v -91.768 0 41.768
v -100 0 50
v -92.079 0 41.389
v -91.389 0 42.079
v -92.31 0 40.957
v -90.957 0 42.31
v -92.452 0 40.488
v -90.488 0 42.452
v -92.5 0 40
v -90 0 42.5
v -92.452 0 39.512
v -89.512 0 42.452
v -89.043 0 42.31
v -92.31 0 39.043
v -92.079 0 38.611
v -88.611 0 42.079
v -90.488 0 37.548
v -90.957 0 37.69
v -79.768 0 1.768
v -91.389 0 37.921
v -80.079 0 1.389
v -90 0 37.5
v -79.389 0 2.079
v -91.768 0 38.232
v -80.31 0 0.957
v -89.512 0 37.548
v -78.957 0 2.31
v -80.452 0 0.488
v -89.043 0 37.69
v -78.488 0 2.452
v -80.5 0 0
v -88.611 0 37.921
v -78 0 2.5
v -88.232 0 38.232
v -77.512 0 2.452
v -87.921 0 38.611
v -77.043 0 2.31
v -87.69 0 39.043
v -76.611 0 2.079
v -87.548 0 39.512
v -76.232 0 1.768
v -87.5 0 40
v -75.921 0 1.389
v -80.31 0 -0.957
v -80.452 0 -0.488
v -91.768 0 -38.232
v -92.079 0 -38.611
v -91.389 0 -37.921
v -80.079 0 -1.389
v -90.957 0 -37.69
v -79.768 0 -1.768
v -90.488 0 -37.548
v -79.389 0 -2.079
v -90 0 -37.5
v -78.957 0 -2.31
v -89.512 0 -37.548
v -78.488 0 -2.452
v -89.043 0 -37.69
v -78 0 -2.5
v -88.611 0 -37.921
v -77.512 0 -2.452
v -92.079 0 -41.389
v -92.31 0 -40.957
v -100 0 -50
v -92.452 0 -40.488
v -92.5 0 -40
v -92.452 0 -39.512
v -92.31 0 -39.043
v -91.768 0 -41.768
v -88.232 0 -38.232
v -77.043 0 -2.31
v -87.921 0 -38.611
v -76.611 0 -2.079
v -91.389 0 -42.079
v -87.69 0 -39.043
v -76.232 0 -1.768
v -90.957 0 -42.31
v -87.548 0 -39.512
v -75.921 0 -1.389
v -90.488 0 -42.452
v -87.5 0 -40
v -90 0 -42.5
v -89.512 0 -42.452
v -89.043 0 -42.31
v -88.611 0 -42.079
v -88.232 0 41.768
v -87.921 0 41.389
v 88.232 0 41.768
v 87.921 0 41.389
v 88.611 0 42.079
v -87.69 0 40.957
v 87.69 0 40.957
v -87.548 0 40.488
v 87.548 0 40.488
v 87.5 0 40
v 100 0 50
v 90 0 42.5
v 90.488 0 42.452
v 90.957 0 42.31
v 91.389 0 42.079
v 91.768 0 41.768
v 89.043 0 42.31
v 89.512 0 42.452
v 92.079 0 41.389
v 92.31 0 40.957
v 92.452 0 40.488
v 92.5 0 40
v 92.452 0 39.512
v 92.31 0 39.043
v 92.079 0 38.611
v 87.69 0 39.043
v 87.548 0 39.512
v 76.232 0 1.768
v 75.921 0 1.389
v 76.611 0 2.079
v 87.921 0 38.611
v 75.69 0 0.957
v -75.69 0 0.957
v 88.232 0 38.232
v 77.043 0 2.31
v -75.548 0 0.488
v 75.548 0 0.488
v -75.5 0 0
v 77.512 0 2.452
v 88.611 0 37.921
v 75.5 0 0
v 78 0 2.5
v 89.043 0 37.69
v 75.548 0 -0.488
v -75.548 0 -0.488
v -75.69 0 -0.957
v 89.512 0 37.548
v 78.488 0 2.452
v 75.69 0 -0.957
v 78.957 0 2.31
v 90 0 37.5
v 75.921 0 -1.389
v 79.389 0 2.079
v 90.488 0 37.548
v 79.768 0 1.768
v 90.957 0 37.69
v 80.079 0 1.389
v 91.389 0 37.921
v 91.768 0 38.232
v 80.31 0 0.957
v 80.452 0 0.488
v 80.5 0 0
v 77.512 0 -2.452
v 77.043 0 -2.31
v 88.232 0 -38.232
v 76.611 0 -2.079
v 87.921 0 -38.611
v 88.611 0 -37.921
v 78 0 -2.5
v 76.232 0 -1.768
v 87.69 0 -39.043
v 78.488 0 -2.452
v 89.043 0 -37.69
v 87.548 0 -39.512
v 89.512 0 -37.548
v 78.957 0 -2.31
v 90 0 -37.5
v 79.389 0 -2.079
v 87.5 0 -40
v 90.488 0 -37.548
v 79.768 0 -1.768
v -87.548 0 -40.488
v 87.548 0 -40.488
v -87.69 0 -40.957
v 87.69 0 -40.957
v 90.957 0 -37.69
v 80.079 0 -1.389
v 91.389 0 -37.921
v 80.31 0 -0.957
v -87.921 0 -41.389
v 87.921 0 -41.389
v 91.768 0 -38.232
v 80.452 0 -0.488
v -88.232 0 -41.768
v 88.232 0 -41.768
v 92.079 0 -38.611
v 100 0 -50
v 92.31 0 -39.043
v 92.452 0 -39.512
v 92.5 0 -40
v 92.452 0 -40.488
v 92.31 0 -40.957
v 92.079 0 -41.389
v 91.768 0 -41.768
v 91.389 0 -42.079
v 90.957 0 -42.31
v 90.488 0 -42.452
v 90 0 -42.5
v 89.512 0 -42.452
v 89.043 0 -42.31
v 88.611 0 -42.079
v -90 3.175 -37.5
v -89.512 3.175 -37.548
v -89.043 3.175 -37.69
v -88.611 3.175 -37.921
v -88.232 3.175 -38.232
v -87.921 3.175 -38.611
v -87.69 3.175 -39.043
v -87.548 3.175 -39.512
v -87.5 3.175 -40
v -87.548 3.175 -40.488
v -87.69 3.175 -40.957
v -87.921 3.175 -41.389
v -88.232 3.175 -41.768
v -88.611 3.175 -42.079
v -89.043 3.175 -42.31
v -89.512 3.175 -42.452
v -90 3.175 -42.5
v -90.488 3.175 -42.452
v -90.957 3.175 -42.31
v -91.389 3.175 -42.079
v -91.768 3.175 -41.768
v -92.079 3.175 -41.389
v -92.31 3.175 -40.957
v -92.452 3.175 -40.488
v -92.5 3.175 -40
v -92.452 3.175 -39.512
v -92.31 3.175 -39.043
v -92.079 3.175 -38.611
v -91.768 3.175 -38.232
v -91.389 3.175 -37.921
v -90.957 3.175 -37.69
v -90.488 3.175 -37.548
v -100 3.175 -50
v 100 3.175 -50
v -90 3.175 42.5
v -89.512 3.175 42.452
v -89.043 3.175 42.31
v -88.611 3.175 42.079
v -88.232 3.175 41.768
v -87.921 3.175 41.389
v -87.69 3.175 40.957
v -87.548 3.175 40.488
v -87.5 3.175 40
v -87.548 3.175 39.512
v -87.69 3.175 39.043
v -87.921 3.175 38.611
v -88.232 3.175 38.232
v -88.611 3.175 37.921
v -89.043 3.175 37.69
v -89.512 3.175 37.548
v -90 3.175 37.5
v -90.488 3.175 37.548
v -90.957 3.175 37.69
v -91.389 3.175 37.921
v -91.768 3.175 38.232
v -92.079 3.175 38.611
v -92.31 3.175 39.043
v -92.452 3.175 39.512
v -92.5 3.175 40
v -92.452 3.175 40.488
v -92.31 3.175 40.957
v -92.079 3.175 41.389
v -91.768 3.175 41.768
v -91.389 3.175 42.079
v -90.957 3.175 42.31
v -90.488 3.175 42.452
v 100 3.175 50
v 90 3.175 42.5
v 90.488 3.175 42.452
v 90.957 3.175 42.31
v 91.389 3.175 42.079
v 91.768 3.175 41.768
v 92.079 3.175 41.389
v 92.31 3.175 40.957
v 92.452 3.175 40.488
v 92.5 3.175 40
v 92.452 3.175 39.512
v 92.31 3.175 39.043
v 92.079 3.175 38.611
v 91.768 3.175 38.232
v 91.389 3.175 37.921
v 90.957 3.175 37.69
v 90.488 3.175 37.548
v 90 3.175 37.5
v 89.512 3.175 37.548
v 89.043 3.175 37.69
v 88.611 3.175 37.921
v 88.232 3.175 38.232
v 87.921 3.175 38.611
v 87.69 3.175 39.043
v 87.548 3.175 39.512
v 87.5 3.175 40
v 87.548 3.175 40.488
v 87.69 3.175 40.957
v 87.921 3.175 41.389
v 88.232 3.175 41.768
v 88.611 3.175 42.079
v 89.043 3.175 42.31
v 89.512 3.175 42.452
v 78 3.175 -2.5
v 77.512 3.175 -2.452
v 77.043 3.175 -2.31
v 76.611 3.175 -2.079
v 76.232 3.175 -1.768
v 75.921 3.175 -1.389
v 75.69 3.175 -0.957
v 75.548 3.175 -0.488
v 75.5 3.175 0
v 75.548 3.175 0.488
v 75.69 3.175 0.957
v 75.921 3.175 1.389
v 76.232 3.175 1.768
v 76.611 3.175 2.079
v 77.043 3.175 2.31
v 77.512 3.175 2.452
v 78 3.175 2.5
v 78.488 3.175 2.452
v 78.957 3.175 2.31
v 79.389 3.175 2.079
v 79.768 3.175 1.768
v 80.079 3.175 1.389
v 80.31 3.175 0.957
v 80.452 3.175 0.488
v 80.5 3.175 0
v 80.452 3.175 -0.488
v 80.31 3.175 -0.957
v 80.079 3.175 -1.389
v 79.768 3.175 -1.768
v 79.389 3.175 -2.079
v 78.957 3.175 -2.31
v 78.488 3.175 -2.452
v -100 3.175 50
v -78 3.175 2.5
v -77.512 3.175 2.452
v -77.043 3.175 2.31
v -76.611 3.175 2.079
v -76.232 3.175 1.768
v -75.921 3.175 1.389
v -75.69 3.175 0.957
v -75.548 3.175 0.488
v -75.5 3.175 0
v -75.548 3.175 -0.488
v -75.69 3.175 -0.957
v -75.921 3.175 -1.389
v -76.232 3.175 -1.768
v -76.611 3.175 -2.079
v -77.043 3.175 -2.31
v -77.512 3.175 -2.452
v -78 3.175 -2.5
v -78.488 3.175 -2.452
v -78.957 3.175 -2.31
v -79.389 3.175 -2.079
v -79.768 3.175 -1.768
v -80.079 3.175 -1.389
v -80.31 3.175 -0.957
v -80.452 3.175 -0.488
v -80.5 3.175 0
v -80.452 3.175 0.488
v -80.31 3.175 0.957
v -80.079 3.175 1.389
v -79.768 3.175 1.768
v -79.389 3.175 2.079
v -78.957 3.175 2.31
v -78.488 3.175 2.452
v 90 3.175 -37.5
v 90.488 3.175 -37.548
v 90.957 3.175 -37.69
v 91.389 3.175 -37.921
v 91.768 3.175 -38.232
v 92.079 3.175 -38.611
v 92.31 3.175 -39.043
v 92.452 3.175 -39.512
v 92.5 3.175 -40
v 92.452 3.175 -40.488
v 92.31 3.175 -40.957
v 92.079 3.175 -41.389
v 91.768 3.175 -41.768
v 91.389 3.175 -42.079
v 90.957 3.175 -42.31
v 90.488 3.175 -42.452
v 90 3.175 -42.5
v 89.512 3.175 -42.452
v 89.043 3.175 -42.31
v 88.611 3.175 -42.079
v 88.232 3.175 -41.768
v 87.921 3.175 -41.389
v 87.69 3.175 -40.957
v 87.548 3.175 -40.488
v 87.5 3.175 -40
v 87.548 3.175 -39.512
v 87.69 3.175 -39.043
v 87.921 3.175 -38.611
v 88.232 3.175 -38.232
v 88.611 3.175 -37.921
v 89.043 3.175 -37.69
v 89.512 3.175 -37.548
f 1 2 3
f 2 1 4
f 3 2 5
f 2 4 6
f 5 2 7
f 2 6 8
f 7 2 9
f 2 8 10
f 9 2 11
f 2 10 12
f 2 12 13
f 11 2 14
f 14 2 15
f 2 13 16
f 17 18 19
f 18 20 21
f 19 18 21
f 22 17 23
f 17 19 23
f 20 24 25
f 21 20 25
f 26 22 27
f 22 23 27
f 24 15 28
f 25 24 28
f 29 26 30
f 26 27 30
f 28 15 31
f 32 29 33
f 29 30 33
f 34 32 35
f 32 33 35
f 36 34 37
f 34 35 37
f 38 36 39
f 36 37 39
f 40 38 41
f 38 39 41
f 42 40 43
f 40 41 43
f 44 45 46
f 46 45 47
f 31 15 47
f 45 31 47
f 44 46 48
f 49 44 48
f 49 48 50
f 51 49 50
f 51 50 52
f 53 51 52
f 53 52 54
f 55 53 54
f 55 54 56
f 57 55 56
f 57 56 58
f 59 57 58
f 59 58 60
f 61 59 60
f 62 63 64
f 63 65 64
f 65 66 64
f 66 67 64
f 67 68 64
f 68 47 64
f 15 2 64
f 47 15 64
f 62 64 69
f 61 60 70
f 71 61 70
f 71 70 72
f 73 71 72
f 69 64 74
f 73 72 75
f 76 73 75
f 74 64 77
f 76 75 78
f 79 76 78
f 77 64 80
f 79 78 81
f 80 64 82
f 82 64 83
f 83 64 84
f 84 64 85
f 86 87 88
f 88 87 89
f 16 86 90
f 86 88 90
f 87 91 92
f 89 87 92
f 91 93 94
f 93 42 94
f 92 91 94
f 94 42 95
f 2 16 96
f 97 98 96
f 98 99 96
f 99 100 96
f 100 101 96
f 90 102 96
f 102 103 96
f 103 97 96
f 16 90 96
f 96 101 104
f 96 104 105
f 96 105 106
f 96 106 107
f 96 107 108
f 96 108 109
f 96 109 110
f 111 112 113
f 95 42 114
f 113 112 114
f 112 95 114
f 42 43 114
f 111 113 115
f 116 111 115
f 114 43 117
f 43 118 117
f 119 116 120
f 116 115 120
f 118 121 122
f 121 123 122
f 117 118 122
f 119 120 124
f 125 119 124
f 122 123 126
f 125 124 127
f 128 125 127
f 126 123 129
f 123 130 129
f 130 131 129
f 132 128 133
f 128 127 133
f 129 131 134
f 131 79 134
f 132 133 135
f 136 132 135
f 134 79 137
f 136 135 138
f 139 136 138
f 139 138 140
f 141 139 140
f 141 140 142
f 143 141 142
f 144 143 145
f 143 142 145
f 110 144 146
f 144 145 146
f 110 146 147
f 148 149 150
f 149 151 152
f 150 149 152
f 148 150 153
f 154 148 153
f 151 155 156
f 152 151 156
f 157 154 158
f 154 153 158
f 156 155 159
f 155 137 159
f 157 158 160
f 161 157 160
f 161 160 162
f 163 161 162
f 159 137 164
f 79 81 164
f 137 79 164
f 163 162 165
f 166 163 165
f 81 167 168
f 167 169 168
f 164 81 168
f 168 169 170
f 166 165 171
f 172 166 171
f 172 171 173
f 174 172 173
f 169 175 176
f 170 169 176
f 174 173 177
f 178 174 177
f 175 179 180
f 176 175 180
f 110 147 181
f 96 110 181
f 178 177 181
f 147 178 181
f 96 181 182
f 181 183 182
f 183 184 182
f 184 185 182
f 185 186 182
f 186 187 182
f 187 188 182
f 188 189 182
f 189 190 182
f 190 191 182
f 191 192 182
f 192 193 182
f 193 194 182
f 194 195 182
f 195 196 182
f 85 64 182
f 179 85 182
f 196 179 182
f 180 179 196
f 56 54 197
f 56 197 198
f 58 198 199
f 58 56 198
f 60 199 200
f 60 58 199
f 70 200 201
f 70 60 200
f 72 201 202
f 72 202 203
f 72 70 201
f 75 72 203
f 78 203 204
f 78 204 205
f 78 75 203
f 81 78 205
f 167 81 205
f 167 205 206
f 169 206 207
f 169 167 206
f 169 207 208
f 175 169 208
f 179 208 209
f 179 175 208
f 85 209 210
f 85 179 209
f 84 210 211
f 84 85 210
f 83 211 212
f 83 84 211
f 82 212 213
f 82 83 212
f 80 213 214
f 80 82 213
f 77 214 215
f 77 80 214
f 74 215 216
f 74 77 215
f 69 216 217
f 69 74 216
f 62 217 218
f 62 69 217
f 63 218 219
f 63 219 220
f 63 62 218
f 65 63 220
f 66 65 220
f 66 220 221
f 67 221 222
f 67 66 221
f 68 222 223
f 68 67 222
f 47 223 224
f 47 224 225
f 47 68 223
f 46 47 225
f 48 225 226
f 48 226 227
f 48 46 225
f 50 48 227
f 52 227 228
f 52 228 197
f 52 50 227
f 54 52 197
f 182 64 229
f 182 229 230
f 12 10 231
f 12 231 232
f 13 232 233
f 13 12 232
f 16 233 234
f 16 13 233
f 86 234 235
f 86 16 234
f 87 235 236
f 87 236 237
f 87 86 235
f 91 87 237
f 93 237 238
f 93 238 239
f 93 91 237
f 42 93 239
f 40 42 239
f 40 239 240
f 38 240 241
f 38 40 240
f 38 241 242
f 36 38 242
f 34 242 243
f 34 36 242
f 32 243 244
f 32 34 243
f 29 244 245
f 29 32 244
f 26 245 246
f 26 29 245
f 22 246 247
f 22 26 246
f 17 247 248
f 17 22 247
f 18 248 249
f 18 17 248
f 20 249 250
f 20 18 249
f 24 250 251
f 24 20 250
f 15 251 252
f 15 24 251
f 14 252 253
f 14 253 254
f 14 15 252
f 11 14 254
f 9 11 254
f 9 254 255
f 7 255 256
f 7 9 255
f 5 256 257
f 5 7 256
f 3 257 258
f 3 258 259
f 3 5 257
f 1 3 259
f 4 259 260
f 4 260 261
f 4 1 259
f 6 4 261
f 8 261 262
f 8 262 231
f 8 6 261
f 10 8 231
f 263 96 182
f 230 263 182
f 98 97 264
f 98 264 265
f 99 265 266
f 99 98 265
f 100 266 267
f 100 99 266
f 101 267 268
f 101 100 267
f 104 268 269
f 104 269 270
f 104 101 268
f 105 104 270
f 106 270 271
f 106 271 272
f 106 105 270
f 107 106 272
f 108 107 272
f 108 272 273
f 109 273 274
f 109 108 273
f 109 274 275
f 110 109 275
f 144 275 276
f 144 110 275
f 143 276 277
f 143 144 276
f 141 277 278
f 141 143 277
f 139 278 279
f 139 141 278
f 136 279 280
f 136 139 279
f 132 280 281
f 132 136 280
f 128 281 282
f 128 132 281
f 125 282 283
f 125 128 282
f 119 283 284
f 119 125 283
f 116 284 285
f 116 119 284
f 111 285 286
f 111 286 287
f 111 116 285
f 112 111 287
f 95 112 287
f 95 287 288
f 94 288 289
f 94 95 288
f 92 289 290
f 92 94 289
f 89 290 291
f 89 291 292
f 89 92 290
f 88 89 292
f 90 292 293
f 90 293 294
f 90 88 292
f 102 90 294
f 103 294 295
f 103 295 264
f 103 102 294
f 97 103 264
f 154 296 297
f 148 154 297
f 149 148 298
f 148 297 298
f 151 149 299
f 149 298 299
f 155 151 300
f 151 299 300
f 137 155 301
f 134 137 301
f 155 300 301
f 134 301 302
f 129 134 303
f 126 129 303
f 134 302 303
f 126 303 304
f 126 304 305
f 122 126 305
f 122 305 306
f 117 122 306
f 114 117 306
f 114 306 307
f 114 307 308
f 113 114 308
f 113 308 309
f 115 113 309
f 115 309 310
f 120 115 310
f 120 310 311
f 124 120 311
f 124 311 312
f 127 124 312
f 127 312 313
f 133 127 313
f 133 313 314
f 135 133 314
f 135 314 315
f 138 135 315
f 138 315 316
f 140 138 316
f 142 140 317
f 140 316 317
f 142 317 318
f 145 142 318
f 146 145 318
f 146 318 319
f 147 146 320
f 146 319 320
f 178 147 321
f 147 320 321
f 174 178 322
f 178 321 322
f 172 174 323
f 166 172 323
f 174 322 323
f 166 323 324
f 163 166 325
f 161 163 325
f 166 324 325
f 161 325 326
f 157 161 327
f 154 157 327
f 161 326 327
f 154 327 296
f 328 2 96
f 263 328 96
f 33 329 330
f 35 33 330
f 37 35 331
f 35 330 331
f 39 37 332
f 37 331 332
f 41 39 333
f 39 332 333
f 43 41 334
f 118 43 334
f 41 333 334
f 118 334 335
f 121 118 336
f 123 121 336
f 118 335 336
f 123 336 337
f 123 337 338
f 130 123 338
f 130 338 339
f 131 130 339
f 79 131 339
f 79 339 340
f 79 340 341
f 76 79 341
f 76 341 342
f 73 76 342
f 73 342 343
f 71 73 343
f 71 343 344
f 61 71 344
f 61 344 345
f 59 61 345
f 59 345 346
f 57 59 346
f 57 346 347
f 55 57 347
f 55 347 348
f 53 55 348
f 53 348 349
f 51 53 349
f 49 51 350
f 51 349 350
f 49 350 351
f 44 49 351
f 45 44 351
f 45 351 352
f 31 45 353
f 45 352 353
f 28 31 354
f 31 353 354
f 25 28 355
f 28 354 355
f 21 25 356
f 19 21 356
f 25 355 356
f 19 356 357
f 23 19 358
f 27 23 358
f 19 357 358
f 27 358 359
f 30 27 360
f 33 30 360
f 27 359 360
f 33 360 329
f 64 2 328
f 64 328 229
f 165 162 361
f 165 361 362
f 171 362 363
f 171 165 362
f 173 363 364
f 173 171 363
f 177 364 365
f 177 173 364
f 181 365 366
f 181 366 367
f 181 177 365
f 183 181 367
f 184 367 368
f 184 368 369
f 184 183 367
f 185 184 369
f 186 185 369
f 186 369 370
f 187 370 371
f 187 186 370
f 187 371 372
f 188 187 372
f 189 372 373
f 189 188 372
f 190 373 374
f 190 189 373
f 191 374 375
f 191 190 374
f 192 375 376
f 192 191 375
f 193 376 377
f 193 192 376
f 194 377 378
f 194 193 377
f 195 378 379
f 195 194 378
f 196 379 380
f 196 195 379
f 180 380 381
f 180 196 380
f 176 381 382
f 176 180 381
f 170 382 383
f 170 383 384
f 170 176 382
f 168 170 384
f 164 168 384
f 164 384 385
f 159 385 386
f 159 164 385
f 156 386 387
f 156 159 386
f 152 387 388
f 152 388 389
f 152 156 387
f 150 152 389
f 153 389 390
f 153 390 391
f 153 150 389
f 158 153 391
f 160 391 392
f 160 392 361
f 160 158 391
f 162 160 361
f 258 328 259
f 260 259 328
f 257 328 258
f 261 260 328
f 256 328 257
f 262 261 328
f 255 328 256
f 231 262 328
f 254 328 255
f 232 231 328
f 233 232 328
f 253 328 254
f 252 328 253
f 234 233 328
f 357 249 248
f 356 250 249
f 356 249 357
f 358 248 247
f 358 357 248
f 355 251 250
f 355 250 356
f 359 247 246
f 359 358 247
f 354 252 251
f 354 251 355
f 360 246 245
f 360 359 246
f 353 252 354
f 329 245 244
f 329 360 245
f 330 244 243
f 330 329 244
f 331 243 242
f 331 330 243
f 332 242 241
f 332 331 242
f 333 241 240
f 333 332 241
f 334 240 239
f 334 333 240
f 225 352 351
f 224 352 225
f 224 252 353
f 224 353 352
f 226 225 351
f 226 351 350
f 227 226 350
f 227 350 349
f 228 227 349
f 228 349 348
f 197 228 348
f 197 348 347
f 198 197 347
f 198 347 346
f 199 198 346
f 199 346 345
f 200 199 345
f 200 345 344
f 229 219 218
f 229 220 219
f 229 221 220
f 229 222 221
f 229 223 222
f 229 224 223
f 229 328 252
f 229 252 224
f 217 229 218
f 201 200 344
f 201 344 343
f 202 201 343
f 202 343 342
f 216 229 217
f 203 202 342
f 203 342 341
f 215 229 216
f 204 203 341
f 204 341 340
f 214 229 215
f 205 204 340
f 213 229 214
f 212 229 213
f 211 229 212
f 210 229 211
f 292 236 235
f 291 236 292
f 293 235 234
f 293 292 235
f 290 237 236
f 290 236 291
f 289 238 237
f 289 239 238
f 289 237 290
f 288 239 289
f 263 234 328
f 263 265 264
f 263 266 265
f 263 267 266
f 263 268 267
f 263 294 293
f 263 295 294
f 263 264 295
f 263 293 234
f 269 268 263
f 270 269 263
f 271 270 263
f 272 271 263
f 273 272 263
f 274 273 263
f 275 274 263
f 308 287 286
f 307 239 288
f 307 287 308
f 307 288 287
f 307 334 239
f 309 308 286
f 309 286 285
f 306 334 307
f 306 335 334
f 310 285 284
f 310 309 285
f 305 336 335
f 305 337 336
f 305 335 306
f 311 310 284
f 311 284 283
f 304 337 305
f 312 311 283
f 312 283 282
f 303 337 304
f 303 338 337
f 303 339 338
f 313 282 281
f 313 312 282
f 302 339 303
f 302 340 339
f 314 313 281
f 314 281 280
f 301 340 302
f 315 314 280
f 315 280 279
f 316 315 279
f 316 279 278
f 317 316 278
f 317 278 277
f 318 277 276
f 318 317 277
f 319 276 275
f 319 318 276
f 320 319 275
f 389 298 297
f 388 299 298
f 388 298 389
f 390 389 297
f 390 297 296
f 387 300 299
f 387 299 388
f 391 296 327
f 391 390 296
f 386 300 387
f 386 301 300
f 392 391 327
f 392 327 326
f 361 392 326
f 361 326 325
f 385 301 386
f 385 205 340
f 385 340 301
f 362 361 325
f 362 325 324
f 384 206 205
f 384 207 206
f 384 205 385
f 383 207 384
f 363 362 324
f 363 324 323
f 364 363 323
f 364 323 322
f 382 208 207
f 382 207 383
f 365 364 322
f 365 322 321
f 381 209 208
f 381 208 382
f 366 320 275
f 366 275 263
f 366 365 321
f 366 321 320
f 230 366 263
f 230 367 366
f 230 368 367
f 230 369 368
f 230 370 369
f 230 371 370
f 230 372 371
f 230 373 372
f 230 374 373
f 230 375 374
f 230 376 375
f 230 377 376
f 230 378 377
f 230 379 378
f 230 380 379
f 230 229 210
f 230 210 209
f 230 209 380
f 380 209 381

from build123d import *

# Parameters (mm, degrees)
SKETCH1_W           = 200
SKETCH1_H           = 100
SKETCH1_R           = 2.5
SKETCH1_W_2         = 120.5
SKETCH1_H_2         = 64
BOSS_EXTRUDE1_DEPTH = 3.175
SKETCH2_R           = 2.5
CUT_EXTRUDE1_DEPTH  = 112.848471715


with BuildPart() as part:
    # Sketch1 → Boss-Extrude1 (new body)
    # profile 1 of 2: a face of its own
    with BuildSketch(Plane(origin=(0, 0, 0), x_dir=(1, 0, 0), z_dir=(0, 1, 0))):
        Rectangle(SKETCH1_W, SKETCH1_H)
        with Locations(Location((90, -40, 0), (0, 0, 270))):
            Circle(SKETCH1_R, mode=Mode.SUBTRACT)
        with Locations(Location((-90, -40, 0), (0, 0, 270))):
            Circle(SKETCH1_R, mode=Mode.SUBTRACT)
        with Locations(Location((-90, 40, 0), (0, 0, 270))):
            Circle(SKETCH1_R, mode=Mode.SUBTRACT)
        with Locations(Location((90, 40, 0), (0, 0, 270))):
            Circle(SKETCH1_R, mode=Mode.SUBTRACT)
        Rectangle(SKETCH1_W_2, SKETCH1_H_2, mode=Mode.SUBTRACT)
    # profile 2 of 2: a face of its own
    with BuildSketch(Plane(origin=(0, 0, 0), x_dir=(1, 0, 0), z_dir=(0, 1, 0))):
        Rectangle(SKETCH1_W_2, SKETCH1_H_2)
    extrude(amount=BOSS_EXTRUDE1_DEPTH)

    # Sketch2 → Cut-Extrude1 (cut, through all)
    with BuildSketch(Plane(origin=(0, 3.175, 0), x_dir=(1, 0, 0), z_dir=(0, 1, 0))):
        with Locations(Location((-78, 0, 0), (0, 0, 270))):
            Circle(SKETCH2_R)
        with Locations(Location((78, 0, 0), (0, 0, 90))):
            Circle(SKETCH2_R)
    extrude(amount=-CUT_EXTRUDE1_DEPTH, mode=Mode.SUBTRACT)


solid = part.part
